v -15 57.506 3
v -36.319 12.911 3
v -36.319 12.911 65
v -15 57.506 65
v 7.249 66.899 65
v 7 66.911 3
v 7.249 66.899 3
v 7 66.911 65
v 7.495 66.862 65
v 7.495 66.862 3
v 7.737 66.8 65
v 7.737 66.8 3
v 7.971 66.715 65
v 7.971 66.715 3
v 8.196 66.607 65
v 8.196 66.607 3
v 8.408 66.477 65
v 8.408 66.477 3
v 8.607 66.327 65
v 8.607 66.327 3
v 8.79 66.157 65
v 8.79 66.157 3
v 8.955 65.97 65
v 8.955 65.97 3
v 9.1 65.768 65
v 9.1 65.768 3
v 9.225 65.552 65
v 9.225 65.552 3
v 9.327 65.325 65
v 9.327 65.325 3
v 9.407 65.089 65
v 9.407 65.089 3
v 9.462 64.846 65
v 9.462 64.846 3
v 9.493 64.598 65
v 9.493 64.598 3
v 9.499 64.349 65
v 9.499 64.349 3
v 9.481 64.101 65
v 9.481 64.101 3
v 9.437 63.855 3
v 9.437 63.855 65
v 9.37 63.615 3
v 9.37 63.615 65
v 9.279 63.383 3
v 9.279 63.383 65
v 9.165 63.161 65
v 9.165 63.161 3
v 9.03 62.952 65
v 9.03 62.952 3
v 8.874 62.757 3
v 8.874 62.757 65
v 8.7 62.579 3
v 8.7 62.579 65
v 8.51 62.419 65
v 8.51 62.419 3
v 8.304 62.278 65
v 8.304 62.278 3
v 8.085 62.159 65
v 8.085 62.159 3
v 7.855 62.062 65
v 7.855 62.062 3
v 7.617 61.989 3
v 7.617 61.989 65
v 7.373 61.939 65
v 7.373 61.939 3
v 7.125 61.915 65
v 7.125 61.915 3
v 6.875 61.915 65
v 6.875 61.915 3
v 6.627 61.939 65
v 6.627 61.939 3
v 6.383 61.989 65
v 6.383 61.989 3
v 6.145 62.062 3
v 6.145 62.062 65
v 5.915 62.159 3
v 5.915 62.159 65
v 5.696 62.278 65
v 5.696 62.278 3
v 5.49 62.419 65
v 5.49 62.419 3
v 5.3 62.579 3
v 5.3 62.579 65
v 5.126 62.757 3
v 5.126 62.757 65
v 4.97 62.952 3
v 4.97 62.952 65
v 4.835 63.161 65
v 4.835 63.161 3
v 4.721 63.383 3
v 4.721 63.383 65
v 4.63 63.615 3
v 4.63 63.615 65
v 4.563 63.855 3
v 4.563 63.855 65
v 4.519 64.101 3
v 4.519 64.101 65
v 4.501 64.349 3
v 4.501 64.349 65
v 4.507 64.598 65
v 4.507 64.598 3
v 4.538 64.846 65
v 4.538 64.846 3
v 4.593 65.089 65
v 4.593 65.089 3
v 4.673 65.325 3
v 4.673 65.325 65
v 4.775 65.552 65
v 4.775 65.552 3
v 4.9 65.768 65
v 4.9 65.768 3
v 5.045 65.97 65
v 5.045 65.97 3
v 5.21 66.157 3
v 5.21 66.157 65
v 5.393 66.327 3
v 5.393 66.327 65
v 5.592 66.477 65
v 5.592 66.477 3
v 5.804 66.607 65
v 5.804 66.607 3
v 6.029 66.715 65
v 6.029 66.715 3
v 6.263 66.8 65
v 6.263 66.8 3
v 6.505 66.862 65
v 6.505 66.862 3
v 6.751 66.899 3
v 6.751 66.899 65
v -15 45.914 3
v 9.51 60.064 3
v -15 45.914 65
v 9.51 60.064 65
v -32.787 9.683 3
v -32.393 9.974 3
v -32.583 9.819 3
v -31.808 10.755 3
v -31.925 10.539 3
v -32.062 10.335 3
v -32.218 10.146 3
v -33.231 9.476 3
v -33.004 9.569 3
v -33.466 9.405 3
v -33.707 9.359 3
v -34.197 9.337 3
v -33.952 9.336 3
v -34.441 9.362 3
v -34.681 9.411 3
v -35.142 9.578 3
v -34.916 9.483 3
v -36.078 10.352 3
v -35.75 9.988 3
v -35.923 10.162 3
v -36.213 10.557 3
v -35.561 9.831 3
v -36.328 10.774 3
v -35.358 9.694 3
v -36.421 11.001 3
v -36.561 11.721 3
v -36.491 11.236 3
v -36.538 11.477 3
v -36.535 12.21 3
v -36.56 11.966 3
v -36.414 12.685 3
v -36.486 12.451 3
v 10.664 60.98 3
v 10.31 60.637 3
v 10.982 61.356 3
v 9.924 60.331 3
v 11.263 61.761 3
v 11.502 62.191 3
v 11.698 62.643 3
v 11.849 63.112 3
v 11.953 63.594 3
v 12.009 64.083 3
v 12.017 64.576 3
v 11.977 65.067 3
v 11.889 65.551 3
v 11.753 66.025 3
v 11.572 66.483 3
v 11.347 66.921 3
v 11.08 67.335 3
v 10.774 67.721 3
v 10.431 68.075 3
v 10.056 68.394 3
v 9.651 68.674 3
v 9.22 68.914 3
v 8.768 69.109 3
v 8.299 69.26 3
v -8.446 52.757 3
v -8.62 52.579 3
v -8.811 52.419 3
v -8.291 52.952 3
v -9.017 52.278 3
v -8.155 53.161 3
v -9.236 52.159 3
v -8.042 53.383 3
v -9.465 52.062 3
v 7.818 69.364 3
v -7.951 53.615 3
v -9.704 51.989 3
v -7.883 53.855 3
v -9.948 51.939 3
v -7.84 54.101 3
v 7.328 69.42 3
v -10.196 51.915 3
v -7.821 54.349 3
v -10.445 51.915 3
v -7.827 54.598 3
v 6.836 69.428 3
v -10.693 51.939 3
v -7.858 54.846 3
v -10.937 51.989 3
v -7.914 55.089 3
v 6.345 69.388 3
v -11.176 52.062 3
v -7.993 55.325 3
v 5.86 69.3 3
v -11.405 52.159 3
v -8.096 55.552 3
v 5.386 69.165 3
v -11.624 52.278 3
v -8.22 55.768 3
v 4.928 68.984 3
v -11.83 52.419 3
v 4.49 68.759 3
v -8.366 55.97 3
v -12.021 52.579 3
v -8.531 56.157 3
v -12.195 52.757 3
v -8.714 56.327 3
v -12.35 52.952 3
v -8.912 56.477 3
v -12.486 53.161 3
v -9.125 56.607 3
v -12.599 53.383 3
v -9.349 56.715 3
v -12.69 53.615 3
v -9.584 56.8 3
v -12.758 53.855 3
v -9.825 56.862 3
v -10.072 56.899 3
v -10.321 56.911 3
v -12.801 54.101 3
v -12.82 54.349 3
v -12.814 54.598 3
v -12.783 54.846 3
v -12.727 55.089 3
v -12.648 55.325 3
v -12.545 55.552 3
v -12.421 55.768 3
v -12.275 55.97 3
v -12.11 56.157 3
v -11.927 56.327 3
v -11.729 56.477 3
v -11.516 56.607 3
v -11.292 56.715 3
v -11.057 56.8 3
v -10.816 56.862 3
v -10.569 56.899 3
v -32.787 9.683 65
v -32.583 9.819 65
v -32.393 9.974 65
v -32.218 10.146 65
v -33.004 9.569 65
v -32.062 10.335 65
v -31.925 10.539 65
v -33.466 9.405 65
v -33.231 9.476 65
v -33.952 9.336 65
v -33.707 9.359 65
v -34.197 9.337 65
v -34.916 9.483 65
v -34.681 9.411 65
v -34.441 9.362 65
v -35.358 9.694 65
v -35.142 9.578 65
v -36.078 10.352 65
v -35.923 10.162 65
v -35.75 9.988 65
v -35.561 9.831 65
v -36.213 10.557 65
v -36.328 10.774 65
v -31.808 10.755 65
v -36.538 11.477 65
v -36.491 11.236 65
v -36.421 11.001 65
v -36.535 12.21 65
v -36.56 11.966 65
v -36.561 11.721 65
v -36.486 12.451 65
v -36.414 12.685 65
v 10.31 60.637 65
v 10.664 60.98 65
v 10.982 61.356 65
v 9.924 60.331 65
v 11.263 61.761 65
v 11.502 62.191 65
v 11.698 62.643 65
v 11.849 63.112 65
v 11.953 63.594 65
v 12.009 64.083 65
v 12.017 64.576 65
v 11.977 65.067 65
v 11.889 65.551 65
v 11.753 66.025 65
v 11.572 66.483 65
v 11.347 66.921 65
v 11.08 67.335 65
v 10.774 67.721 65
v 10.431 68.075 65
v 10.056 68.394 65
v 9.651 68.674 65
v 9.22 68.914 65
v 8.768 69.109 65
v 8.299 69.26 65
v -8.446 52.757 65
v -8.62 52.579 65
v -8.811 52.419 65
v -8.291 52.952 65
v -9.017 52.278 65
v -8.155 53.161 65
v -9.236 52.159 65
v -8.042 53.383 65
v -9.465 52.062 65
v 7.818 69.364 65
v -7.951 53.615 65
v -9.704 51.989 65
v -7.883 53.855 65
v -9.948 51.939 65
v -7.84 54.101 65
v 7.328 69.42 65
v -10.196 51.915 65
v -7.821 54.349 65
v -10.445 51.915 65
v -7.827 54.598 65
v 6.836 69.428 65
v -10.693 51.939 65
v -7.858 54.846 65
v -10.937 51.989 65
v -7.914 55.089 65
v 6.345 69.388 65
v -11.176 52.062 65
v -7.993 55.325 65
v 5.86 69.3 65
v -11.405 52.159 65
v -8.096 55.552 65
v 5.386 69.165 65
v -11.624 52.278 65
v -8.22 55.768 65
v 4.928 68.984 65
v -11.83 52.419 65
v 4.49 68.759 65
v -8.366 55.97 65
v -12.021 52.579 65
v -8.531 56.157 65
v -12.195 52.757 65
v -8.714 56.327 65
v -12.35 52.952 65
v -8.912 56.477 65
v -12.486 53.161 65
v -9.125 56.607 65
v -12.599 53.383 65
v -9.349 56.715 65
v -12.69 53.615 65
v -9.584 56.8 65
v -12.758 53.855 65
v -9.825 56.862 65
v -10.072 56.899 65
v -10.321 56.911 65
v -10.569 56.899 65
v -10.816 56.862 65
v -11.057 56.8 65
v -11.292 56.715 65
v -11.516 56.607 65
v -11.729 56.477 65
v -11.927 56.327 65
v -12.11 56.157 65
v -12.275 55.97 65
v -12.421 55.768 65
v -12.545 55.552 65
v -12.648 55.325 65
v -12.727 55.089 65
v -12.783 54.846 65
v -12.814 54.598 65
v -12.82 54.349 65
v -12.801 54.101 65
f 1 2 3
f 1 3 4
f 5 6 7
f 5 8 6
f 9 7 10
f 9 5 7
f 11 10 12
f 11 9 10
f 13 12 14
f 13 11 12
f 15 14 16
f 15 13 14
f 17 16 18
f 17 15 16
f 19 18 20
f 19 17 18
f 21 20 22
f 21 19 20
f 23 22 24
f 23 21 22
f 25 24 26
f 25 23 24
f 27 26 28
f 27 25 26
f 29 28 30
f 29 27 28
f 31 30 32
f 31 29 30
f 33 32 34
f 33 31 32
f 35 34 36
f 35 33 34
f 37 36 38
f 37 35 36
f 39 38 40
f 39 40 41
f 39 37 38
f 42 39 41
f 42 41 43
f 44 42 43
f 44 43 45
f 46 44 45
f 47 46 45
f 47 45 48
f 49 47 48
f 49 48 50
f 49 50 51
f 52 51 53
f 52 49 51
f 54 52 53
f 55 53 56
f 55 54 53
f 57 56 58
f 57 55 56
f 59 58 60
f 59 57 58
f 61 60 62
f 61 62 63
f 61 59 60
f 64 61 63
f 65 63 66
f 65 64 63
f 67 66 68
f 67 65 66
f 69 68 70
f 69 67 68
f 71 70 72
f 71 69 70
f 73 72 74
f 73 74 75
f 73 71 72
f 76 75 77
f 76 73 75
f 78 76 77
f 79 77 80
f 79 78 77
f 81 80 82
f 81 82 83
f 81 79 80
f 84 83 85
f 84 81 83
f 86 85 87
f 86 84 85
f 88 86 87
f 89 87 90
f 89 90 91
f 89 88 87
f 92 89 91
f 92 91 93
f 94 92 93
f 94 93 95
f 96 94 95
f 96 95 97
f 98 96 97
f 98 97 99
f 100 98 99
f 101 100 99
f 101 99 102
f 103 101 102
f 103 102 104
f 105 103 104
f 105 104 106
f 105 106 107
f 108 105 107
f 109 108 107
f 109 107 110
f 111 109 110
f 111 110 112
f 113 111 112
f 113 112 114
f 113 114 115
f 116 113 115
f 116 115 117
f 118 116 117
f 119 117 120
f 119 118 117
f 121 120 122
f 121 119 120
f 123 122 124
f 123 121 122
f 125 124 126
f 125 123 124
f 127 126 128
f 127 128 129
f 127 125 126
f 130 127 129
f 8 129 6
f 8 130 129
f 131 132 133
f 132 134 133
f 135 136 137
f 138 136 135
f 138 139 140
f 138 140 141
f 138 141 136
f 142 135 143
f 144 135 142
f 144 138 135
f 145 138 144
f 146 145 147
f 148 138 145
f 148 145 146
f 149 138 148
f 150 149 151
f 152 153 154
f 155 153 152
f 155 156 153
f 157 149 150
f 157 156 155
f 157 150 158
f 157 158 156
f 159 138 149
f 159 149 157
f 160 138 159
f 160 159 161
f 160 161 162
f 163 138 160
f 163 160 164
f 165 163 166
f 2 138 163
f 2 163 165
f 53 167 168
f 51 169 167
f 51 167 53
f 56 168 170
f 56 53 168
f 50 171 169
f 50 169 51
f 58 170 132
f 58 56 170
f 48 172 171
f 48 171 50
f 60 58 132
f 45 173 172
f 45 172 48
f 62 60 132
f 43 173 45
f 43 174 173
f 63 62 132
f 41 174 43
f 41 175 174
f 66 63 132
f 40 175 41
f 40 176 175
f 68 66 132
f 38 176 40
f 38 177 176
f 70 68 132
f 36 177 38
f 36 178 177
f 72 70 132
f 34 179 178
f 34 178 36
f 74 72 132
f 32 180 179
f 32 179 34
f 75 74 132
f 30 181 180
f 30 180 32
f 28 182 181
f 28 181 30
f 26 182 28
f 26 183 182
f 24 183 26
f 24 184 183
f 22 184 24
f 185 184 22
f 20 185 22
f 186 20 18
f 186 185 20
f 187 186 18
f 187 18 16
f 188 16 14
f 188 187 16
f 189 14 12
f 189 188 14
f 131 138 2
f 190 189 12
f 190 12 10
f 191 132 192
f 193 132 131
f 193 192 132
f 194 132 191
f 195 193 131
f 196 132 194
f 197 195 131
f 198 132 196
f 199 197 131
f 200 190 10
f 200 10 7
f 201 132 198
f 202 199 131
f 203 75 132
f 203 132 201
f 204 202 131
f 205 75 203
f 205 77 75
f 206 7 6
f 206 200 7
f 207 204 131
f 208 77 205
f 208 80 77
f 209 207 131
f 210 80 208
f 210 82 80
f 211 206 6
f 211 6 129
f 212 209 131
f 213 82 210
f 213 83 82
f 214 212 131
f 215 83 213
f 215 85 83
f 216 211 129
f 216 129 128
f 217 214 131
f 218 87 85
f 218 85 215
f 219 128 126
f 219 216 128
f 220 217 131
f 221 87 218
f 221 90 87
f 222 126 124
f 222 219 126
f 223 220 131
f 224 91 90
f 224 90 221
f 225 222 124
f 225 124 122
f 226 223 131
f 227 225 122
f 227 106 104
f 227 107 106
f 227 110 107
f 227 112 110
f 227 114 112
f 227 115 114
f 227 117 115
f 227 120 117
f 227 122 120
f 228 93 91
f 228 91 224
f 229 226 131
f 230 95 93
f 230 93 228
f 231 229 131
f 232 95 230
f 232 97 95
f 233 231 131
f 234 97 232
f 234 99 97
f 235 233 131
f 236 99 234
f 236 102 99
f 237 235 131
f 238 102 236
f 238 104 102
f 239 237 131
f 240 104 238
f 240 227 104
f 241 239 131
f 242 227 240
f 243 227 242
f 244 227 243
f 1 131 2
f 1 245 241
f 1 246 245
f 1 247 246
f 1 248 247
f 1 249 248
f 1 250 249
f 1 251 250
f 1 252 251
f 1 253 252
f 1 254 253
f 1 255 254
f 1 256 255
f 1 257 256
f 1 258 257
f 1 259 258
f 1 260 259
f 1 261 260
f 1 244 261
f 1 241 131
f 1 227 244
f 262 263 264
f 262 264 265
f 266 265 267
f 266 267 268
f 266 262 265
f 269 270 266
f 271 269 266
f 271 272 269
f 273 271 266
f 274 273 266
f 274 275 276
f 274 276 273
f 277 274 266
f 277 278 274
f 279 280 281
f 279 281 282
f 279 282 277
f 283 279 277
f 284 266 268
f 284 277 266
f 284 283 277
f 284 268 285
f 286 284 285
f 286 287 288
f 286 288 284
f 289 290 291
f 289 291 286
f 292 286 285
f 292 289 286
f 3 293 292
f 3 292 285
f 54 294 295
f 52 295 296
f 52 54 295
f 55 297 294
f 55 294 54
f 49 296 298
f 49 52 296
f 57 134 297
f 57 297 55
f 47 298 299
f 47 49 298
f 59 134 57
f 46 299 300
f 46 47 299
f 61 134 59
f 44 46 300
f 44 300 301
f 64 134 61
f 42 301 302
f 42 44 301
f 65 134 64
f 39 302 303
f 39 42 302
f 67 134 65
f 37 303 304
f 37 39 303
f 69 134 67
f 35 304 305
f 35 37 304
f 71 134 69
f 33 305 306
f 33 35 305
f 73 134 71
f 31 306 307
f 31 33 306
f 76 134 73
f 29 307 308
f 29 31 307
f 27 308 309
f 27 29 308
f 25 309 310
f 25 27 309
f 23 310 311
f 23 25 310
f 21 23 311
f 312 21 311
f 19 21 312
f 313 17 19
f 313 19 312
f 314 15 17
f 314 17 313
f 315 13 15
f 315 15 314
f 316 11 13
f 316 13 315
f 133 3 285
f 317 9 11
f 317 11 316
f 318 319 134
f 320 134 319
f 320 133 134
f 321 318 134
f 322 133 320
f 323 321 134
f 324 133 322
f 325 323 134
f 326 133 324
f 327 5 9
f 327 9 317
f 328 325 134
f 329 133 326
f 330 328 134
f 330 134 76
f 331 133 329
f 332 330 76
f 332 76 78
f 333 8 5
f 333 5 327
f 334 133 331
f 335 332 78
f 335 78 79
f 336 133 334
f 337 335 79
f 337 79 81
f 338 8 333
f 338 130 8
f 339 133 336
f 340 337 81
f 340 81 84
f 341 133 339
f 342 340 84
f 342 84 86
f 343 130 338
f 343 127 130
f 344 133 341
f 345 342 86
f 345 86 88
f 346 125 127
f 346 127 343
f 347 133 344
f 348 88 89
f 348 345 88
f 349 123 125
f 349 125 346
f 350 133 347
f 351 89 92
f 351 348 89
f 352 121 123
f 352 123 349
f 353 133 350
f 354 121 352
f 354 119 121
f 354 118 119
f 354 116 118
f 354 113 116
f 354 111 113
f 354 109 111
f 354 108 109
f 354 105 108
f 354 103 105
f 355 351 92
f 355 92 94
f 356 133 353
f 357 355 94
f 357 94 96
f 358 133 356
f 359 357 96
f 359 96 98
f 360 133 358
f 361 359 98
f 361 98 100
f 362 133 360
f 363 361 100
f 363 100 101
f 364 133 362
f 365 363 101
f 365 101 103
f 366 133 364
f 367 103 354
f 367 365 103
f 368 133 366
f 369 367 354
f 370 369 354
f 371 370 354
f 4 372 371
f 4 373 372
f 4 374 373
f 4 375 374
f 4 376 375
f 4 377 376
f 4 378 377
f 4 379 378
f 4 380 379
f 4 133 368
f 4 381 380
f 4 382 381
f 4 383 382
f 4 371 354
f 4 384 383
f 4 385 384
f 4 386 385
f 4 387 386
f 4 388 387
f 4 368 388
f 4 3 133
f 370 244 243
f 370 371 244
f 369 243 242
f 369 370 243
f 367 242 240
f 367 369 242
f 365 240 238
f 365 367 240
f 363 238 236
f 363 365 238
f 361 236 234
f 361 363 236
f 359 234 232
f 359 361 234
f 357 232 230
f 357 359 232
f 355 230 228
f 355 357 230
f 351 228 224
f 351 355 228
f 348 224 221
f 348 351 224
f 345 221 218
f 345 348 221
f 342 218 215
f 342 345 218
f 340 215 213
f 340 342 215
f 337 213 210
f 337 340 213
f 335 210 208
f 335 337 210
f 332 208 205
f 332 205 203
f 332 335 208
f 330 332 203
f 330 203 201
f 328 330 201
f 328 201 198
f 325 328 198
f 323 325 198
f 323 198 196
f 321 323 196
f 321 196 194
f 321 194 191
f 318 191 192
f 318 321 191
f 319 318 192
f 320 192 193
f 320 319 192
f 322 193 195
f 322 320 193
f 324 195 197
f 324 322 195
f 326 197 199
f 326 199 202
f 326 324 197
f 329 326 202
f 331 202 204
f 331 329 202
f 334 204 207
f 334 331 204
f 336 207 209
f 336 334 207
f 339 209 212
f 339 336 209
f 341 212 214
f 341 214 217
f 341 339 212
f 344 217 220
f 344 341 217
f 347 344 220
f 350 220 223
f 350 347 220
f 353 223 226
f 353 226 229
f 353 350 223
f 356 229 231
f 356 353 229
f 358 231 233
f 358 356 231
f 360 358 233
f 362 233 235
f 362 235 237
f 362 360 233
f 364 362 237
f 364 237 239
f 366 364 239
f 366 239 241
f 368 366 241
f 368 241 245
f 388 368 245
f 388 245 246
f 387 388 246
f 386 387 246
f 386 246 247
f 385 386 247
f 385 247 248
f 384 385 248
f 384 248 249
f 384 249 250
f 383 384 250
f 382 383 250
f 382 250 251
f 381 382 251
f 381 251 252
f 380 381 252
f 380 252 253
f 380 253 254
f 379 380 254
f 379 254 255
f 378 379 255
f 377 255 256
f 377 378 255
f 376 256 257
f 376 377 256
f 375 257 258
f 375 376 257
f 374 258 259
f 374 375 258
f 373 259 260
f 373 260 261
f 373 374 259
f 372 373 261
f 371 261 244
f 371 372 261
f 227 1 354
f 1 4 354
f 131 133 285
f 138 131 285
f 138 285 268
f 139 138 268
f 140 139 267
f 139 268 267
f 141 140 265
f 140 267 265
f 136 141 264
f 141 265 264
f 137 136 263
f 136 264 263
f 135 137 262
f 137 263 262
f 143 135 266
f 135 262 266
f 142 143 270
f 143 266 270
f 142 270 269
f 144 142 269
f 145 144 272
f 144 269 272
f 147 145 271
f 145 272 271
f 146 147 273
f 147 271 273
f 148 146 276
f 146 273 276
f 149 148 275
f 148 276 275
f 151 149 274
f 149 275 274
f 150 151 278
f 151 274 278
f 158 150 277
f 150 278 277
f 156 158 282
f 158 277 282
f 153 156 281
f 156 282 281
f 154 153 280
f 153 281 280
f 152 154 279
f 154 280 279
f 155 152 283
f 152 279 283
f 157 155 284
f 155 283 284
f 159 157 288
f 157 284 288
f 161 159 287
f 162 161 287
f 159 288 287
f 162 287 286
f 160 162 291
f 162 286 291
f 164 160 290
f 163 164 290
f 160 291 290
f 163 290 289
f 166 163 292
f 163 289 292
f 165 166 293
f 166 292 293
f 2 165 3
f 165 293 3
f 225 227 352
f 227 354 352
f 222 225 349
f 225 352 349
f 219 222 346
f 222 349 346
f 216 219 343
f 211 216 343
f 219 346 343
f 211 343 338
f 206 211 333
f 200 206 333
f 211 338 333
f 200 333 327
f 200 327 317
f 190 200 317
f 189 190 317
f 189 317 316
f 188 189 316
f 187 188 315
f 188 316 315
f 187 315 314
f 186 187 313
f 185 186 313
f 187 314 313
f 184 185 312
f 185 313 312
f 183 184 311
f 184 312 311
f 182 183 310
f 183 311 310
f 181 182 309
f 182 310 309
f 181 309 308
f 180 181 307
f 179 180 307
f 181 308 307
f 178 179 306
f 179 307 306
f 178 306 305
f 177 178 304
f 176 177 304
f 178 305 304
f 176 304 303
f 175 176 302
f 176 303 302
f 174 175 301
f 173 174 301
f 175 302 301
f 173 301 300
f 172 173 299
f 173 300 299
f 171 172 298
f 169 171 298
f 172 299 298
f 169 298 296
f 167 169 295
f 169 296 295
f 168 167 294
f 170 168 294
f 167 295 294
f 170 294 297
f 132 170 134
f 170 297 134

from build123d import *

# Parameters (mm, degrees)
SKETCH_1_R               = 10
SKETCH_1_R_2             = 2.5
EXTRUDE_1_DEPTH          = 70
SKETCH_2_W               = 60
SKETCH_2_H               = 70
SKETCH_2_H_2             = 67.94057246
CUT_EXTRUDE_1_DEPTH      = 70
EXTRUDE_2_DEPTH          = 60
CUT_EXTRUDE_3_DEPTH      = 129.790186287
CUT_EXTRUDE_3_DEPTH_BACK = 129.790186287
SKETCH_6_R               = 2.5
CUT_EXTRUDE_4_DEPTH      = 132.384596068
CUT_EXTRUDE_4_DEPTH_BACK = 132.384596068
SKETCH_7_W               = 40.15837314
SKETCH_7_H               = 126.534822783
SKETCH_7_W_2             = 29.990396309
SKETCH_7_H_2             = 127.151063803
SKETCH_8_R               = 2.5
EXTRUDE_4_DEPTH          = 2


with BuildPart() as part:
    # 草图1 → 凸台-拉伸1 (new body)
    with BuildSketch(Plane.XY):
        with BuildLine():
            Line((-15, 90), (-15, 0))
            ThreePointArc((-15, 0), (0, -15), (15, 0))
            Line((15, 0), (15, 90))
            ThreePointArc((15, 90), (0, 105), (-15, 90))
        make_face()
        Circle(SKETCH_1_R, mode=Mode.SUBTRACT)
        with Locations((0, 90)):
            Circle(SKETCH_1_R_2, mode=Mode.SUBTRACT)
    extrude(amount=EXTRUDE_1_DEPTH)

    # 草图2 → 切除-拉伸1 (cut)
    with BuildSketch(Plane.ZY.offset(15)):
        with Locations((35, 80)):
            Rectangle(SKETCH_2_W, SKETCH_2_H)
        with Locations((35, 11.02971377)):
            Rectangle(SKETCH_2_W, SKETCH_2_H_2)
    extrude(amount=-CUT_EXTRUDE_1_DEPTH, mode=Mode.SUBTRACT)


with BuildPart() as cut_extrude_1_piece_1:
    # of the separate pieces the step leaves, piece 1, a body of its own (cut_extrude_1_pieces)
    add(part.part.solids().sort_by_distance((15, 0, 0))[0])



with BuildPart() as cut_extrude_1_piece_2:
    # of the separate pieces the step leaves, piece 2, a body of its own (cut_extrude_1_pieces)
    add(part.part.solids().sort_by_distance((15, 0, 65))[0])


with BuildPart() as cut_extrude_1_piece_1_1:
    add(cut_extrude_1_piece_1.part)

    add(cut_extrude_1_piece_2.part)  # 凸台-拉伸2 merges 切除-拉伸1 piece 2
    # 草图4 → 凸台-拉伸2 (add)
    with BuildSketch(Plane(origin=(0, 0, 65), x_dir=(-1, 0, 0), z_dir=(0, 0, -1))):
        with BuildLine():
            Line((-4.490156776, 68.758657712), (15, 57.50601045))
            Line((15, 57.50601045), (36.319312502, 12.911360415))
            ThreePointArc((36.319312502, 12.911360415), (35.142094618, 9.577570071), (31.808304274, 10.754787955))
            Line((31.808304274, 10.754787955), (15, 45.913541163))
            Line((15, 45.913541163), (-9.509843224, 60.064305746))
            ThreePointArc((-9.509843224, 60.064305746), (-11.347175983, 66.921324953), (-4.490156776, 68.758657712))
        make_face()
    extrude(amount=EXTRUDE_2_DEPTH)

    # 草图6 → 切除-拉伸3 (cut, two sides: drawn at the far end of the back side and taken through both)
    with BuildSketch(Plane(origin=(0, 0, 65), x_dir=(-1, 0, 0), z_dir=(0, 0, -1)).offset(-CUT_EXTRUDE_3_DEPTH_BACK)):
        with Locations(Location((-7, 64.411481729, 0), (0, 0, 90))):
            Circle(SKETCH_6_R)
        with Locations(Location((-11.650635095, 53.212249296, 0), (0, 0, 90))):
            Circle(SKETCH_6_R)
        with Locations(Location((10, 40.712249296, 0), (0, 0, 90))):
            Circle(SKETCH_6_R)
        with Locations(Location((10.320508076, 54.411481729, 0), (0, 0, 90))):
            Circle(SKETCH_6_R)
    extrude(amount=CUT_EXTRUDE_3_DEPTH + CUT_EXTRUDE_3_DEPTH_BACK, mode=Mode.SUBTRACT)

    # 草图7 → 切除-拉伸4 (cut, two sides: drawn at the far end of the back side and taken through both)
    with BuildSketch(Plane(origin=(0, 0, 0), x_dir=(0, 0, -1), z_dir=(1, 0, 0)).offset(-CUT_EXTRUDE_4_DEPTH_BACK)):
        with Locations((15.07918657, 44.332405561)):
            Rectangle(SKETCH_7_W, SKETCH_7_H)
        with Locations((-79.995198155, 44.024285052)):
            Rectangle(SKETCH_7_W_2, SKETCH_7_H_2)
    extrude(amount=CUT_EXTRUDE_4_DEPTH + CUT_EXTRUDE_4_DEPTH_BACK, mode=Mode.SUBTRACT)

    # 草图8 → 凸台-拉伸4 (add)
    with BuildSketch(Plane(origin=(0, 0, 5), x_dir=(-1, 0, 0), z_dir=(0, 0, -1))):
        with BuildLine():
            Line((36.319312502, 12.911360415), (15, 57.50601045))
            Line((15, 57.50601045), (-4.490156776, 68.758657712))
            ThreePointArc((-4.490156776, 68.758657712), (-11.347175983, 66.921324953), (-9.509843224, 60.064305746))
            Line((-9.509843224, 60.064305746), (15, 45.913541163))
            Line((15, 45.913541163), (31.808304274, 10.754787955))
            ThreePointArc((31.808304274, 10.754787955), (35.142094618, 9.577570071), (36.319312502, 12.911360415))
        make_face()
        with Locations(Location((-7, 64.411481729, 0), (0, 0, 90))):
            Circle(SKETCH_8_R, mode=Mode.SUBTRACT)
        with Locations(Location((10.320508076, 54.411481729, 0), (0, 0, 90))):
            Circle(SKETCH_8_R, mode=Mode.SUBTRACT)
    extrude(amount=EXTRUDE_4_DEPTH)


solid = cut_extrude_1_piece_1_1.part
